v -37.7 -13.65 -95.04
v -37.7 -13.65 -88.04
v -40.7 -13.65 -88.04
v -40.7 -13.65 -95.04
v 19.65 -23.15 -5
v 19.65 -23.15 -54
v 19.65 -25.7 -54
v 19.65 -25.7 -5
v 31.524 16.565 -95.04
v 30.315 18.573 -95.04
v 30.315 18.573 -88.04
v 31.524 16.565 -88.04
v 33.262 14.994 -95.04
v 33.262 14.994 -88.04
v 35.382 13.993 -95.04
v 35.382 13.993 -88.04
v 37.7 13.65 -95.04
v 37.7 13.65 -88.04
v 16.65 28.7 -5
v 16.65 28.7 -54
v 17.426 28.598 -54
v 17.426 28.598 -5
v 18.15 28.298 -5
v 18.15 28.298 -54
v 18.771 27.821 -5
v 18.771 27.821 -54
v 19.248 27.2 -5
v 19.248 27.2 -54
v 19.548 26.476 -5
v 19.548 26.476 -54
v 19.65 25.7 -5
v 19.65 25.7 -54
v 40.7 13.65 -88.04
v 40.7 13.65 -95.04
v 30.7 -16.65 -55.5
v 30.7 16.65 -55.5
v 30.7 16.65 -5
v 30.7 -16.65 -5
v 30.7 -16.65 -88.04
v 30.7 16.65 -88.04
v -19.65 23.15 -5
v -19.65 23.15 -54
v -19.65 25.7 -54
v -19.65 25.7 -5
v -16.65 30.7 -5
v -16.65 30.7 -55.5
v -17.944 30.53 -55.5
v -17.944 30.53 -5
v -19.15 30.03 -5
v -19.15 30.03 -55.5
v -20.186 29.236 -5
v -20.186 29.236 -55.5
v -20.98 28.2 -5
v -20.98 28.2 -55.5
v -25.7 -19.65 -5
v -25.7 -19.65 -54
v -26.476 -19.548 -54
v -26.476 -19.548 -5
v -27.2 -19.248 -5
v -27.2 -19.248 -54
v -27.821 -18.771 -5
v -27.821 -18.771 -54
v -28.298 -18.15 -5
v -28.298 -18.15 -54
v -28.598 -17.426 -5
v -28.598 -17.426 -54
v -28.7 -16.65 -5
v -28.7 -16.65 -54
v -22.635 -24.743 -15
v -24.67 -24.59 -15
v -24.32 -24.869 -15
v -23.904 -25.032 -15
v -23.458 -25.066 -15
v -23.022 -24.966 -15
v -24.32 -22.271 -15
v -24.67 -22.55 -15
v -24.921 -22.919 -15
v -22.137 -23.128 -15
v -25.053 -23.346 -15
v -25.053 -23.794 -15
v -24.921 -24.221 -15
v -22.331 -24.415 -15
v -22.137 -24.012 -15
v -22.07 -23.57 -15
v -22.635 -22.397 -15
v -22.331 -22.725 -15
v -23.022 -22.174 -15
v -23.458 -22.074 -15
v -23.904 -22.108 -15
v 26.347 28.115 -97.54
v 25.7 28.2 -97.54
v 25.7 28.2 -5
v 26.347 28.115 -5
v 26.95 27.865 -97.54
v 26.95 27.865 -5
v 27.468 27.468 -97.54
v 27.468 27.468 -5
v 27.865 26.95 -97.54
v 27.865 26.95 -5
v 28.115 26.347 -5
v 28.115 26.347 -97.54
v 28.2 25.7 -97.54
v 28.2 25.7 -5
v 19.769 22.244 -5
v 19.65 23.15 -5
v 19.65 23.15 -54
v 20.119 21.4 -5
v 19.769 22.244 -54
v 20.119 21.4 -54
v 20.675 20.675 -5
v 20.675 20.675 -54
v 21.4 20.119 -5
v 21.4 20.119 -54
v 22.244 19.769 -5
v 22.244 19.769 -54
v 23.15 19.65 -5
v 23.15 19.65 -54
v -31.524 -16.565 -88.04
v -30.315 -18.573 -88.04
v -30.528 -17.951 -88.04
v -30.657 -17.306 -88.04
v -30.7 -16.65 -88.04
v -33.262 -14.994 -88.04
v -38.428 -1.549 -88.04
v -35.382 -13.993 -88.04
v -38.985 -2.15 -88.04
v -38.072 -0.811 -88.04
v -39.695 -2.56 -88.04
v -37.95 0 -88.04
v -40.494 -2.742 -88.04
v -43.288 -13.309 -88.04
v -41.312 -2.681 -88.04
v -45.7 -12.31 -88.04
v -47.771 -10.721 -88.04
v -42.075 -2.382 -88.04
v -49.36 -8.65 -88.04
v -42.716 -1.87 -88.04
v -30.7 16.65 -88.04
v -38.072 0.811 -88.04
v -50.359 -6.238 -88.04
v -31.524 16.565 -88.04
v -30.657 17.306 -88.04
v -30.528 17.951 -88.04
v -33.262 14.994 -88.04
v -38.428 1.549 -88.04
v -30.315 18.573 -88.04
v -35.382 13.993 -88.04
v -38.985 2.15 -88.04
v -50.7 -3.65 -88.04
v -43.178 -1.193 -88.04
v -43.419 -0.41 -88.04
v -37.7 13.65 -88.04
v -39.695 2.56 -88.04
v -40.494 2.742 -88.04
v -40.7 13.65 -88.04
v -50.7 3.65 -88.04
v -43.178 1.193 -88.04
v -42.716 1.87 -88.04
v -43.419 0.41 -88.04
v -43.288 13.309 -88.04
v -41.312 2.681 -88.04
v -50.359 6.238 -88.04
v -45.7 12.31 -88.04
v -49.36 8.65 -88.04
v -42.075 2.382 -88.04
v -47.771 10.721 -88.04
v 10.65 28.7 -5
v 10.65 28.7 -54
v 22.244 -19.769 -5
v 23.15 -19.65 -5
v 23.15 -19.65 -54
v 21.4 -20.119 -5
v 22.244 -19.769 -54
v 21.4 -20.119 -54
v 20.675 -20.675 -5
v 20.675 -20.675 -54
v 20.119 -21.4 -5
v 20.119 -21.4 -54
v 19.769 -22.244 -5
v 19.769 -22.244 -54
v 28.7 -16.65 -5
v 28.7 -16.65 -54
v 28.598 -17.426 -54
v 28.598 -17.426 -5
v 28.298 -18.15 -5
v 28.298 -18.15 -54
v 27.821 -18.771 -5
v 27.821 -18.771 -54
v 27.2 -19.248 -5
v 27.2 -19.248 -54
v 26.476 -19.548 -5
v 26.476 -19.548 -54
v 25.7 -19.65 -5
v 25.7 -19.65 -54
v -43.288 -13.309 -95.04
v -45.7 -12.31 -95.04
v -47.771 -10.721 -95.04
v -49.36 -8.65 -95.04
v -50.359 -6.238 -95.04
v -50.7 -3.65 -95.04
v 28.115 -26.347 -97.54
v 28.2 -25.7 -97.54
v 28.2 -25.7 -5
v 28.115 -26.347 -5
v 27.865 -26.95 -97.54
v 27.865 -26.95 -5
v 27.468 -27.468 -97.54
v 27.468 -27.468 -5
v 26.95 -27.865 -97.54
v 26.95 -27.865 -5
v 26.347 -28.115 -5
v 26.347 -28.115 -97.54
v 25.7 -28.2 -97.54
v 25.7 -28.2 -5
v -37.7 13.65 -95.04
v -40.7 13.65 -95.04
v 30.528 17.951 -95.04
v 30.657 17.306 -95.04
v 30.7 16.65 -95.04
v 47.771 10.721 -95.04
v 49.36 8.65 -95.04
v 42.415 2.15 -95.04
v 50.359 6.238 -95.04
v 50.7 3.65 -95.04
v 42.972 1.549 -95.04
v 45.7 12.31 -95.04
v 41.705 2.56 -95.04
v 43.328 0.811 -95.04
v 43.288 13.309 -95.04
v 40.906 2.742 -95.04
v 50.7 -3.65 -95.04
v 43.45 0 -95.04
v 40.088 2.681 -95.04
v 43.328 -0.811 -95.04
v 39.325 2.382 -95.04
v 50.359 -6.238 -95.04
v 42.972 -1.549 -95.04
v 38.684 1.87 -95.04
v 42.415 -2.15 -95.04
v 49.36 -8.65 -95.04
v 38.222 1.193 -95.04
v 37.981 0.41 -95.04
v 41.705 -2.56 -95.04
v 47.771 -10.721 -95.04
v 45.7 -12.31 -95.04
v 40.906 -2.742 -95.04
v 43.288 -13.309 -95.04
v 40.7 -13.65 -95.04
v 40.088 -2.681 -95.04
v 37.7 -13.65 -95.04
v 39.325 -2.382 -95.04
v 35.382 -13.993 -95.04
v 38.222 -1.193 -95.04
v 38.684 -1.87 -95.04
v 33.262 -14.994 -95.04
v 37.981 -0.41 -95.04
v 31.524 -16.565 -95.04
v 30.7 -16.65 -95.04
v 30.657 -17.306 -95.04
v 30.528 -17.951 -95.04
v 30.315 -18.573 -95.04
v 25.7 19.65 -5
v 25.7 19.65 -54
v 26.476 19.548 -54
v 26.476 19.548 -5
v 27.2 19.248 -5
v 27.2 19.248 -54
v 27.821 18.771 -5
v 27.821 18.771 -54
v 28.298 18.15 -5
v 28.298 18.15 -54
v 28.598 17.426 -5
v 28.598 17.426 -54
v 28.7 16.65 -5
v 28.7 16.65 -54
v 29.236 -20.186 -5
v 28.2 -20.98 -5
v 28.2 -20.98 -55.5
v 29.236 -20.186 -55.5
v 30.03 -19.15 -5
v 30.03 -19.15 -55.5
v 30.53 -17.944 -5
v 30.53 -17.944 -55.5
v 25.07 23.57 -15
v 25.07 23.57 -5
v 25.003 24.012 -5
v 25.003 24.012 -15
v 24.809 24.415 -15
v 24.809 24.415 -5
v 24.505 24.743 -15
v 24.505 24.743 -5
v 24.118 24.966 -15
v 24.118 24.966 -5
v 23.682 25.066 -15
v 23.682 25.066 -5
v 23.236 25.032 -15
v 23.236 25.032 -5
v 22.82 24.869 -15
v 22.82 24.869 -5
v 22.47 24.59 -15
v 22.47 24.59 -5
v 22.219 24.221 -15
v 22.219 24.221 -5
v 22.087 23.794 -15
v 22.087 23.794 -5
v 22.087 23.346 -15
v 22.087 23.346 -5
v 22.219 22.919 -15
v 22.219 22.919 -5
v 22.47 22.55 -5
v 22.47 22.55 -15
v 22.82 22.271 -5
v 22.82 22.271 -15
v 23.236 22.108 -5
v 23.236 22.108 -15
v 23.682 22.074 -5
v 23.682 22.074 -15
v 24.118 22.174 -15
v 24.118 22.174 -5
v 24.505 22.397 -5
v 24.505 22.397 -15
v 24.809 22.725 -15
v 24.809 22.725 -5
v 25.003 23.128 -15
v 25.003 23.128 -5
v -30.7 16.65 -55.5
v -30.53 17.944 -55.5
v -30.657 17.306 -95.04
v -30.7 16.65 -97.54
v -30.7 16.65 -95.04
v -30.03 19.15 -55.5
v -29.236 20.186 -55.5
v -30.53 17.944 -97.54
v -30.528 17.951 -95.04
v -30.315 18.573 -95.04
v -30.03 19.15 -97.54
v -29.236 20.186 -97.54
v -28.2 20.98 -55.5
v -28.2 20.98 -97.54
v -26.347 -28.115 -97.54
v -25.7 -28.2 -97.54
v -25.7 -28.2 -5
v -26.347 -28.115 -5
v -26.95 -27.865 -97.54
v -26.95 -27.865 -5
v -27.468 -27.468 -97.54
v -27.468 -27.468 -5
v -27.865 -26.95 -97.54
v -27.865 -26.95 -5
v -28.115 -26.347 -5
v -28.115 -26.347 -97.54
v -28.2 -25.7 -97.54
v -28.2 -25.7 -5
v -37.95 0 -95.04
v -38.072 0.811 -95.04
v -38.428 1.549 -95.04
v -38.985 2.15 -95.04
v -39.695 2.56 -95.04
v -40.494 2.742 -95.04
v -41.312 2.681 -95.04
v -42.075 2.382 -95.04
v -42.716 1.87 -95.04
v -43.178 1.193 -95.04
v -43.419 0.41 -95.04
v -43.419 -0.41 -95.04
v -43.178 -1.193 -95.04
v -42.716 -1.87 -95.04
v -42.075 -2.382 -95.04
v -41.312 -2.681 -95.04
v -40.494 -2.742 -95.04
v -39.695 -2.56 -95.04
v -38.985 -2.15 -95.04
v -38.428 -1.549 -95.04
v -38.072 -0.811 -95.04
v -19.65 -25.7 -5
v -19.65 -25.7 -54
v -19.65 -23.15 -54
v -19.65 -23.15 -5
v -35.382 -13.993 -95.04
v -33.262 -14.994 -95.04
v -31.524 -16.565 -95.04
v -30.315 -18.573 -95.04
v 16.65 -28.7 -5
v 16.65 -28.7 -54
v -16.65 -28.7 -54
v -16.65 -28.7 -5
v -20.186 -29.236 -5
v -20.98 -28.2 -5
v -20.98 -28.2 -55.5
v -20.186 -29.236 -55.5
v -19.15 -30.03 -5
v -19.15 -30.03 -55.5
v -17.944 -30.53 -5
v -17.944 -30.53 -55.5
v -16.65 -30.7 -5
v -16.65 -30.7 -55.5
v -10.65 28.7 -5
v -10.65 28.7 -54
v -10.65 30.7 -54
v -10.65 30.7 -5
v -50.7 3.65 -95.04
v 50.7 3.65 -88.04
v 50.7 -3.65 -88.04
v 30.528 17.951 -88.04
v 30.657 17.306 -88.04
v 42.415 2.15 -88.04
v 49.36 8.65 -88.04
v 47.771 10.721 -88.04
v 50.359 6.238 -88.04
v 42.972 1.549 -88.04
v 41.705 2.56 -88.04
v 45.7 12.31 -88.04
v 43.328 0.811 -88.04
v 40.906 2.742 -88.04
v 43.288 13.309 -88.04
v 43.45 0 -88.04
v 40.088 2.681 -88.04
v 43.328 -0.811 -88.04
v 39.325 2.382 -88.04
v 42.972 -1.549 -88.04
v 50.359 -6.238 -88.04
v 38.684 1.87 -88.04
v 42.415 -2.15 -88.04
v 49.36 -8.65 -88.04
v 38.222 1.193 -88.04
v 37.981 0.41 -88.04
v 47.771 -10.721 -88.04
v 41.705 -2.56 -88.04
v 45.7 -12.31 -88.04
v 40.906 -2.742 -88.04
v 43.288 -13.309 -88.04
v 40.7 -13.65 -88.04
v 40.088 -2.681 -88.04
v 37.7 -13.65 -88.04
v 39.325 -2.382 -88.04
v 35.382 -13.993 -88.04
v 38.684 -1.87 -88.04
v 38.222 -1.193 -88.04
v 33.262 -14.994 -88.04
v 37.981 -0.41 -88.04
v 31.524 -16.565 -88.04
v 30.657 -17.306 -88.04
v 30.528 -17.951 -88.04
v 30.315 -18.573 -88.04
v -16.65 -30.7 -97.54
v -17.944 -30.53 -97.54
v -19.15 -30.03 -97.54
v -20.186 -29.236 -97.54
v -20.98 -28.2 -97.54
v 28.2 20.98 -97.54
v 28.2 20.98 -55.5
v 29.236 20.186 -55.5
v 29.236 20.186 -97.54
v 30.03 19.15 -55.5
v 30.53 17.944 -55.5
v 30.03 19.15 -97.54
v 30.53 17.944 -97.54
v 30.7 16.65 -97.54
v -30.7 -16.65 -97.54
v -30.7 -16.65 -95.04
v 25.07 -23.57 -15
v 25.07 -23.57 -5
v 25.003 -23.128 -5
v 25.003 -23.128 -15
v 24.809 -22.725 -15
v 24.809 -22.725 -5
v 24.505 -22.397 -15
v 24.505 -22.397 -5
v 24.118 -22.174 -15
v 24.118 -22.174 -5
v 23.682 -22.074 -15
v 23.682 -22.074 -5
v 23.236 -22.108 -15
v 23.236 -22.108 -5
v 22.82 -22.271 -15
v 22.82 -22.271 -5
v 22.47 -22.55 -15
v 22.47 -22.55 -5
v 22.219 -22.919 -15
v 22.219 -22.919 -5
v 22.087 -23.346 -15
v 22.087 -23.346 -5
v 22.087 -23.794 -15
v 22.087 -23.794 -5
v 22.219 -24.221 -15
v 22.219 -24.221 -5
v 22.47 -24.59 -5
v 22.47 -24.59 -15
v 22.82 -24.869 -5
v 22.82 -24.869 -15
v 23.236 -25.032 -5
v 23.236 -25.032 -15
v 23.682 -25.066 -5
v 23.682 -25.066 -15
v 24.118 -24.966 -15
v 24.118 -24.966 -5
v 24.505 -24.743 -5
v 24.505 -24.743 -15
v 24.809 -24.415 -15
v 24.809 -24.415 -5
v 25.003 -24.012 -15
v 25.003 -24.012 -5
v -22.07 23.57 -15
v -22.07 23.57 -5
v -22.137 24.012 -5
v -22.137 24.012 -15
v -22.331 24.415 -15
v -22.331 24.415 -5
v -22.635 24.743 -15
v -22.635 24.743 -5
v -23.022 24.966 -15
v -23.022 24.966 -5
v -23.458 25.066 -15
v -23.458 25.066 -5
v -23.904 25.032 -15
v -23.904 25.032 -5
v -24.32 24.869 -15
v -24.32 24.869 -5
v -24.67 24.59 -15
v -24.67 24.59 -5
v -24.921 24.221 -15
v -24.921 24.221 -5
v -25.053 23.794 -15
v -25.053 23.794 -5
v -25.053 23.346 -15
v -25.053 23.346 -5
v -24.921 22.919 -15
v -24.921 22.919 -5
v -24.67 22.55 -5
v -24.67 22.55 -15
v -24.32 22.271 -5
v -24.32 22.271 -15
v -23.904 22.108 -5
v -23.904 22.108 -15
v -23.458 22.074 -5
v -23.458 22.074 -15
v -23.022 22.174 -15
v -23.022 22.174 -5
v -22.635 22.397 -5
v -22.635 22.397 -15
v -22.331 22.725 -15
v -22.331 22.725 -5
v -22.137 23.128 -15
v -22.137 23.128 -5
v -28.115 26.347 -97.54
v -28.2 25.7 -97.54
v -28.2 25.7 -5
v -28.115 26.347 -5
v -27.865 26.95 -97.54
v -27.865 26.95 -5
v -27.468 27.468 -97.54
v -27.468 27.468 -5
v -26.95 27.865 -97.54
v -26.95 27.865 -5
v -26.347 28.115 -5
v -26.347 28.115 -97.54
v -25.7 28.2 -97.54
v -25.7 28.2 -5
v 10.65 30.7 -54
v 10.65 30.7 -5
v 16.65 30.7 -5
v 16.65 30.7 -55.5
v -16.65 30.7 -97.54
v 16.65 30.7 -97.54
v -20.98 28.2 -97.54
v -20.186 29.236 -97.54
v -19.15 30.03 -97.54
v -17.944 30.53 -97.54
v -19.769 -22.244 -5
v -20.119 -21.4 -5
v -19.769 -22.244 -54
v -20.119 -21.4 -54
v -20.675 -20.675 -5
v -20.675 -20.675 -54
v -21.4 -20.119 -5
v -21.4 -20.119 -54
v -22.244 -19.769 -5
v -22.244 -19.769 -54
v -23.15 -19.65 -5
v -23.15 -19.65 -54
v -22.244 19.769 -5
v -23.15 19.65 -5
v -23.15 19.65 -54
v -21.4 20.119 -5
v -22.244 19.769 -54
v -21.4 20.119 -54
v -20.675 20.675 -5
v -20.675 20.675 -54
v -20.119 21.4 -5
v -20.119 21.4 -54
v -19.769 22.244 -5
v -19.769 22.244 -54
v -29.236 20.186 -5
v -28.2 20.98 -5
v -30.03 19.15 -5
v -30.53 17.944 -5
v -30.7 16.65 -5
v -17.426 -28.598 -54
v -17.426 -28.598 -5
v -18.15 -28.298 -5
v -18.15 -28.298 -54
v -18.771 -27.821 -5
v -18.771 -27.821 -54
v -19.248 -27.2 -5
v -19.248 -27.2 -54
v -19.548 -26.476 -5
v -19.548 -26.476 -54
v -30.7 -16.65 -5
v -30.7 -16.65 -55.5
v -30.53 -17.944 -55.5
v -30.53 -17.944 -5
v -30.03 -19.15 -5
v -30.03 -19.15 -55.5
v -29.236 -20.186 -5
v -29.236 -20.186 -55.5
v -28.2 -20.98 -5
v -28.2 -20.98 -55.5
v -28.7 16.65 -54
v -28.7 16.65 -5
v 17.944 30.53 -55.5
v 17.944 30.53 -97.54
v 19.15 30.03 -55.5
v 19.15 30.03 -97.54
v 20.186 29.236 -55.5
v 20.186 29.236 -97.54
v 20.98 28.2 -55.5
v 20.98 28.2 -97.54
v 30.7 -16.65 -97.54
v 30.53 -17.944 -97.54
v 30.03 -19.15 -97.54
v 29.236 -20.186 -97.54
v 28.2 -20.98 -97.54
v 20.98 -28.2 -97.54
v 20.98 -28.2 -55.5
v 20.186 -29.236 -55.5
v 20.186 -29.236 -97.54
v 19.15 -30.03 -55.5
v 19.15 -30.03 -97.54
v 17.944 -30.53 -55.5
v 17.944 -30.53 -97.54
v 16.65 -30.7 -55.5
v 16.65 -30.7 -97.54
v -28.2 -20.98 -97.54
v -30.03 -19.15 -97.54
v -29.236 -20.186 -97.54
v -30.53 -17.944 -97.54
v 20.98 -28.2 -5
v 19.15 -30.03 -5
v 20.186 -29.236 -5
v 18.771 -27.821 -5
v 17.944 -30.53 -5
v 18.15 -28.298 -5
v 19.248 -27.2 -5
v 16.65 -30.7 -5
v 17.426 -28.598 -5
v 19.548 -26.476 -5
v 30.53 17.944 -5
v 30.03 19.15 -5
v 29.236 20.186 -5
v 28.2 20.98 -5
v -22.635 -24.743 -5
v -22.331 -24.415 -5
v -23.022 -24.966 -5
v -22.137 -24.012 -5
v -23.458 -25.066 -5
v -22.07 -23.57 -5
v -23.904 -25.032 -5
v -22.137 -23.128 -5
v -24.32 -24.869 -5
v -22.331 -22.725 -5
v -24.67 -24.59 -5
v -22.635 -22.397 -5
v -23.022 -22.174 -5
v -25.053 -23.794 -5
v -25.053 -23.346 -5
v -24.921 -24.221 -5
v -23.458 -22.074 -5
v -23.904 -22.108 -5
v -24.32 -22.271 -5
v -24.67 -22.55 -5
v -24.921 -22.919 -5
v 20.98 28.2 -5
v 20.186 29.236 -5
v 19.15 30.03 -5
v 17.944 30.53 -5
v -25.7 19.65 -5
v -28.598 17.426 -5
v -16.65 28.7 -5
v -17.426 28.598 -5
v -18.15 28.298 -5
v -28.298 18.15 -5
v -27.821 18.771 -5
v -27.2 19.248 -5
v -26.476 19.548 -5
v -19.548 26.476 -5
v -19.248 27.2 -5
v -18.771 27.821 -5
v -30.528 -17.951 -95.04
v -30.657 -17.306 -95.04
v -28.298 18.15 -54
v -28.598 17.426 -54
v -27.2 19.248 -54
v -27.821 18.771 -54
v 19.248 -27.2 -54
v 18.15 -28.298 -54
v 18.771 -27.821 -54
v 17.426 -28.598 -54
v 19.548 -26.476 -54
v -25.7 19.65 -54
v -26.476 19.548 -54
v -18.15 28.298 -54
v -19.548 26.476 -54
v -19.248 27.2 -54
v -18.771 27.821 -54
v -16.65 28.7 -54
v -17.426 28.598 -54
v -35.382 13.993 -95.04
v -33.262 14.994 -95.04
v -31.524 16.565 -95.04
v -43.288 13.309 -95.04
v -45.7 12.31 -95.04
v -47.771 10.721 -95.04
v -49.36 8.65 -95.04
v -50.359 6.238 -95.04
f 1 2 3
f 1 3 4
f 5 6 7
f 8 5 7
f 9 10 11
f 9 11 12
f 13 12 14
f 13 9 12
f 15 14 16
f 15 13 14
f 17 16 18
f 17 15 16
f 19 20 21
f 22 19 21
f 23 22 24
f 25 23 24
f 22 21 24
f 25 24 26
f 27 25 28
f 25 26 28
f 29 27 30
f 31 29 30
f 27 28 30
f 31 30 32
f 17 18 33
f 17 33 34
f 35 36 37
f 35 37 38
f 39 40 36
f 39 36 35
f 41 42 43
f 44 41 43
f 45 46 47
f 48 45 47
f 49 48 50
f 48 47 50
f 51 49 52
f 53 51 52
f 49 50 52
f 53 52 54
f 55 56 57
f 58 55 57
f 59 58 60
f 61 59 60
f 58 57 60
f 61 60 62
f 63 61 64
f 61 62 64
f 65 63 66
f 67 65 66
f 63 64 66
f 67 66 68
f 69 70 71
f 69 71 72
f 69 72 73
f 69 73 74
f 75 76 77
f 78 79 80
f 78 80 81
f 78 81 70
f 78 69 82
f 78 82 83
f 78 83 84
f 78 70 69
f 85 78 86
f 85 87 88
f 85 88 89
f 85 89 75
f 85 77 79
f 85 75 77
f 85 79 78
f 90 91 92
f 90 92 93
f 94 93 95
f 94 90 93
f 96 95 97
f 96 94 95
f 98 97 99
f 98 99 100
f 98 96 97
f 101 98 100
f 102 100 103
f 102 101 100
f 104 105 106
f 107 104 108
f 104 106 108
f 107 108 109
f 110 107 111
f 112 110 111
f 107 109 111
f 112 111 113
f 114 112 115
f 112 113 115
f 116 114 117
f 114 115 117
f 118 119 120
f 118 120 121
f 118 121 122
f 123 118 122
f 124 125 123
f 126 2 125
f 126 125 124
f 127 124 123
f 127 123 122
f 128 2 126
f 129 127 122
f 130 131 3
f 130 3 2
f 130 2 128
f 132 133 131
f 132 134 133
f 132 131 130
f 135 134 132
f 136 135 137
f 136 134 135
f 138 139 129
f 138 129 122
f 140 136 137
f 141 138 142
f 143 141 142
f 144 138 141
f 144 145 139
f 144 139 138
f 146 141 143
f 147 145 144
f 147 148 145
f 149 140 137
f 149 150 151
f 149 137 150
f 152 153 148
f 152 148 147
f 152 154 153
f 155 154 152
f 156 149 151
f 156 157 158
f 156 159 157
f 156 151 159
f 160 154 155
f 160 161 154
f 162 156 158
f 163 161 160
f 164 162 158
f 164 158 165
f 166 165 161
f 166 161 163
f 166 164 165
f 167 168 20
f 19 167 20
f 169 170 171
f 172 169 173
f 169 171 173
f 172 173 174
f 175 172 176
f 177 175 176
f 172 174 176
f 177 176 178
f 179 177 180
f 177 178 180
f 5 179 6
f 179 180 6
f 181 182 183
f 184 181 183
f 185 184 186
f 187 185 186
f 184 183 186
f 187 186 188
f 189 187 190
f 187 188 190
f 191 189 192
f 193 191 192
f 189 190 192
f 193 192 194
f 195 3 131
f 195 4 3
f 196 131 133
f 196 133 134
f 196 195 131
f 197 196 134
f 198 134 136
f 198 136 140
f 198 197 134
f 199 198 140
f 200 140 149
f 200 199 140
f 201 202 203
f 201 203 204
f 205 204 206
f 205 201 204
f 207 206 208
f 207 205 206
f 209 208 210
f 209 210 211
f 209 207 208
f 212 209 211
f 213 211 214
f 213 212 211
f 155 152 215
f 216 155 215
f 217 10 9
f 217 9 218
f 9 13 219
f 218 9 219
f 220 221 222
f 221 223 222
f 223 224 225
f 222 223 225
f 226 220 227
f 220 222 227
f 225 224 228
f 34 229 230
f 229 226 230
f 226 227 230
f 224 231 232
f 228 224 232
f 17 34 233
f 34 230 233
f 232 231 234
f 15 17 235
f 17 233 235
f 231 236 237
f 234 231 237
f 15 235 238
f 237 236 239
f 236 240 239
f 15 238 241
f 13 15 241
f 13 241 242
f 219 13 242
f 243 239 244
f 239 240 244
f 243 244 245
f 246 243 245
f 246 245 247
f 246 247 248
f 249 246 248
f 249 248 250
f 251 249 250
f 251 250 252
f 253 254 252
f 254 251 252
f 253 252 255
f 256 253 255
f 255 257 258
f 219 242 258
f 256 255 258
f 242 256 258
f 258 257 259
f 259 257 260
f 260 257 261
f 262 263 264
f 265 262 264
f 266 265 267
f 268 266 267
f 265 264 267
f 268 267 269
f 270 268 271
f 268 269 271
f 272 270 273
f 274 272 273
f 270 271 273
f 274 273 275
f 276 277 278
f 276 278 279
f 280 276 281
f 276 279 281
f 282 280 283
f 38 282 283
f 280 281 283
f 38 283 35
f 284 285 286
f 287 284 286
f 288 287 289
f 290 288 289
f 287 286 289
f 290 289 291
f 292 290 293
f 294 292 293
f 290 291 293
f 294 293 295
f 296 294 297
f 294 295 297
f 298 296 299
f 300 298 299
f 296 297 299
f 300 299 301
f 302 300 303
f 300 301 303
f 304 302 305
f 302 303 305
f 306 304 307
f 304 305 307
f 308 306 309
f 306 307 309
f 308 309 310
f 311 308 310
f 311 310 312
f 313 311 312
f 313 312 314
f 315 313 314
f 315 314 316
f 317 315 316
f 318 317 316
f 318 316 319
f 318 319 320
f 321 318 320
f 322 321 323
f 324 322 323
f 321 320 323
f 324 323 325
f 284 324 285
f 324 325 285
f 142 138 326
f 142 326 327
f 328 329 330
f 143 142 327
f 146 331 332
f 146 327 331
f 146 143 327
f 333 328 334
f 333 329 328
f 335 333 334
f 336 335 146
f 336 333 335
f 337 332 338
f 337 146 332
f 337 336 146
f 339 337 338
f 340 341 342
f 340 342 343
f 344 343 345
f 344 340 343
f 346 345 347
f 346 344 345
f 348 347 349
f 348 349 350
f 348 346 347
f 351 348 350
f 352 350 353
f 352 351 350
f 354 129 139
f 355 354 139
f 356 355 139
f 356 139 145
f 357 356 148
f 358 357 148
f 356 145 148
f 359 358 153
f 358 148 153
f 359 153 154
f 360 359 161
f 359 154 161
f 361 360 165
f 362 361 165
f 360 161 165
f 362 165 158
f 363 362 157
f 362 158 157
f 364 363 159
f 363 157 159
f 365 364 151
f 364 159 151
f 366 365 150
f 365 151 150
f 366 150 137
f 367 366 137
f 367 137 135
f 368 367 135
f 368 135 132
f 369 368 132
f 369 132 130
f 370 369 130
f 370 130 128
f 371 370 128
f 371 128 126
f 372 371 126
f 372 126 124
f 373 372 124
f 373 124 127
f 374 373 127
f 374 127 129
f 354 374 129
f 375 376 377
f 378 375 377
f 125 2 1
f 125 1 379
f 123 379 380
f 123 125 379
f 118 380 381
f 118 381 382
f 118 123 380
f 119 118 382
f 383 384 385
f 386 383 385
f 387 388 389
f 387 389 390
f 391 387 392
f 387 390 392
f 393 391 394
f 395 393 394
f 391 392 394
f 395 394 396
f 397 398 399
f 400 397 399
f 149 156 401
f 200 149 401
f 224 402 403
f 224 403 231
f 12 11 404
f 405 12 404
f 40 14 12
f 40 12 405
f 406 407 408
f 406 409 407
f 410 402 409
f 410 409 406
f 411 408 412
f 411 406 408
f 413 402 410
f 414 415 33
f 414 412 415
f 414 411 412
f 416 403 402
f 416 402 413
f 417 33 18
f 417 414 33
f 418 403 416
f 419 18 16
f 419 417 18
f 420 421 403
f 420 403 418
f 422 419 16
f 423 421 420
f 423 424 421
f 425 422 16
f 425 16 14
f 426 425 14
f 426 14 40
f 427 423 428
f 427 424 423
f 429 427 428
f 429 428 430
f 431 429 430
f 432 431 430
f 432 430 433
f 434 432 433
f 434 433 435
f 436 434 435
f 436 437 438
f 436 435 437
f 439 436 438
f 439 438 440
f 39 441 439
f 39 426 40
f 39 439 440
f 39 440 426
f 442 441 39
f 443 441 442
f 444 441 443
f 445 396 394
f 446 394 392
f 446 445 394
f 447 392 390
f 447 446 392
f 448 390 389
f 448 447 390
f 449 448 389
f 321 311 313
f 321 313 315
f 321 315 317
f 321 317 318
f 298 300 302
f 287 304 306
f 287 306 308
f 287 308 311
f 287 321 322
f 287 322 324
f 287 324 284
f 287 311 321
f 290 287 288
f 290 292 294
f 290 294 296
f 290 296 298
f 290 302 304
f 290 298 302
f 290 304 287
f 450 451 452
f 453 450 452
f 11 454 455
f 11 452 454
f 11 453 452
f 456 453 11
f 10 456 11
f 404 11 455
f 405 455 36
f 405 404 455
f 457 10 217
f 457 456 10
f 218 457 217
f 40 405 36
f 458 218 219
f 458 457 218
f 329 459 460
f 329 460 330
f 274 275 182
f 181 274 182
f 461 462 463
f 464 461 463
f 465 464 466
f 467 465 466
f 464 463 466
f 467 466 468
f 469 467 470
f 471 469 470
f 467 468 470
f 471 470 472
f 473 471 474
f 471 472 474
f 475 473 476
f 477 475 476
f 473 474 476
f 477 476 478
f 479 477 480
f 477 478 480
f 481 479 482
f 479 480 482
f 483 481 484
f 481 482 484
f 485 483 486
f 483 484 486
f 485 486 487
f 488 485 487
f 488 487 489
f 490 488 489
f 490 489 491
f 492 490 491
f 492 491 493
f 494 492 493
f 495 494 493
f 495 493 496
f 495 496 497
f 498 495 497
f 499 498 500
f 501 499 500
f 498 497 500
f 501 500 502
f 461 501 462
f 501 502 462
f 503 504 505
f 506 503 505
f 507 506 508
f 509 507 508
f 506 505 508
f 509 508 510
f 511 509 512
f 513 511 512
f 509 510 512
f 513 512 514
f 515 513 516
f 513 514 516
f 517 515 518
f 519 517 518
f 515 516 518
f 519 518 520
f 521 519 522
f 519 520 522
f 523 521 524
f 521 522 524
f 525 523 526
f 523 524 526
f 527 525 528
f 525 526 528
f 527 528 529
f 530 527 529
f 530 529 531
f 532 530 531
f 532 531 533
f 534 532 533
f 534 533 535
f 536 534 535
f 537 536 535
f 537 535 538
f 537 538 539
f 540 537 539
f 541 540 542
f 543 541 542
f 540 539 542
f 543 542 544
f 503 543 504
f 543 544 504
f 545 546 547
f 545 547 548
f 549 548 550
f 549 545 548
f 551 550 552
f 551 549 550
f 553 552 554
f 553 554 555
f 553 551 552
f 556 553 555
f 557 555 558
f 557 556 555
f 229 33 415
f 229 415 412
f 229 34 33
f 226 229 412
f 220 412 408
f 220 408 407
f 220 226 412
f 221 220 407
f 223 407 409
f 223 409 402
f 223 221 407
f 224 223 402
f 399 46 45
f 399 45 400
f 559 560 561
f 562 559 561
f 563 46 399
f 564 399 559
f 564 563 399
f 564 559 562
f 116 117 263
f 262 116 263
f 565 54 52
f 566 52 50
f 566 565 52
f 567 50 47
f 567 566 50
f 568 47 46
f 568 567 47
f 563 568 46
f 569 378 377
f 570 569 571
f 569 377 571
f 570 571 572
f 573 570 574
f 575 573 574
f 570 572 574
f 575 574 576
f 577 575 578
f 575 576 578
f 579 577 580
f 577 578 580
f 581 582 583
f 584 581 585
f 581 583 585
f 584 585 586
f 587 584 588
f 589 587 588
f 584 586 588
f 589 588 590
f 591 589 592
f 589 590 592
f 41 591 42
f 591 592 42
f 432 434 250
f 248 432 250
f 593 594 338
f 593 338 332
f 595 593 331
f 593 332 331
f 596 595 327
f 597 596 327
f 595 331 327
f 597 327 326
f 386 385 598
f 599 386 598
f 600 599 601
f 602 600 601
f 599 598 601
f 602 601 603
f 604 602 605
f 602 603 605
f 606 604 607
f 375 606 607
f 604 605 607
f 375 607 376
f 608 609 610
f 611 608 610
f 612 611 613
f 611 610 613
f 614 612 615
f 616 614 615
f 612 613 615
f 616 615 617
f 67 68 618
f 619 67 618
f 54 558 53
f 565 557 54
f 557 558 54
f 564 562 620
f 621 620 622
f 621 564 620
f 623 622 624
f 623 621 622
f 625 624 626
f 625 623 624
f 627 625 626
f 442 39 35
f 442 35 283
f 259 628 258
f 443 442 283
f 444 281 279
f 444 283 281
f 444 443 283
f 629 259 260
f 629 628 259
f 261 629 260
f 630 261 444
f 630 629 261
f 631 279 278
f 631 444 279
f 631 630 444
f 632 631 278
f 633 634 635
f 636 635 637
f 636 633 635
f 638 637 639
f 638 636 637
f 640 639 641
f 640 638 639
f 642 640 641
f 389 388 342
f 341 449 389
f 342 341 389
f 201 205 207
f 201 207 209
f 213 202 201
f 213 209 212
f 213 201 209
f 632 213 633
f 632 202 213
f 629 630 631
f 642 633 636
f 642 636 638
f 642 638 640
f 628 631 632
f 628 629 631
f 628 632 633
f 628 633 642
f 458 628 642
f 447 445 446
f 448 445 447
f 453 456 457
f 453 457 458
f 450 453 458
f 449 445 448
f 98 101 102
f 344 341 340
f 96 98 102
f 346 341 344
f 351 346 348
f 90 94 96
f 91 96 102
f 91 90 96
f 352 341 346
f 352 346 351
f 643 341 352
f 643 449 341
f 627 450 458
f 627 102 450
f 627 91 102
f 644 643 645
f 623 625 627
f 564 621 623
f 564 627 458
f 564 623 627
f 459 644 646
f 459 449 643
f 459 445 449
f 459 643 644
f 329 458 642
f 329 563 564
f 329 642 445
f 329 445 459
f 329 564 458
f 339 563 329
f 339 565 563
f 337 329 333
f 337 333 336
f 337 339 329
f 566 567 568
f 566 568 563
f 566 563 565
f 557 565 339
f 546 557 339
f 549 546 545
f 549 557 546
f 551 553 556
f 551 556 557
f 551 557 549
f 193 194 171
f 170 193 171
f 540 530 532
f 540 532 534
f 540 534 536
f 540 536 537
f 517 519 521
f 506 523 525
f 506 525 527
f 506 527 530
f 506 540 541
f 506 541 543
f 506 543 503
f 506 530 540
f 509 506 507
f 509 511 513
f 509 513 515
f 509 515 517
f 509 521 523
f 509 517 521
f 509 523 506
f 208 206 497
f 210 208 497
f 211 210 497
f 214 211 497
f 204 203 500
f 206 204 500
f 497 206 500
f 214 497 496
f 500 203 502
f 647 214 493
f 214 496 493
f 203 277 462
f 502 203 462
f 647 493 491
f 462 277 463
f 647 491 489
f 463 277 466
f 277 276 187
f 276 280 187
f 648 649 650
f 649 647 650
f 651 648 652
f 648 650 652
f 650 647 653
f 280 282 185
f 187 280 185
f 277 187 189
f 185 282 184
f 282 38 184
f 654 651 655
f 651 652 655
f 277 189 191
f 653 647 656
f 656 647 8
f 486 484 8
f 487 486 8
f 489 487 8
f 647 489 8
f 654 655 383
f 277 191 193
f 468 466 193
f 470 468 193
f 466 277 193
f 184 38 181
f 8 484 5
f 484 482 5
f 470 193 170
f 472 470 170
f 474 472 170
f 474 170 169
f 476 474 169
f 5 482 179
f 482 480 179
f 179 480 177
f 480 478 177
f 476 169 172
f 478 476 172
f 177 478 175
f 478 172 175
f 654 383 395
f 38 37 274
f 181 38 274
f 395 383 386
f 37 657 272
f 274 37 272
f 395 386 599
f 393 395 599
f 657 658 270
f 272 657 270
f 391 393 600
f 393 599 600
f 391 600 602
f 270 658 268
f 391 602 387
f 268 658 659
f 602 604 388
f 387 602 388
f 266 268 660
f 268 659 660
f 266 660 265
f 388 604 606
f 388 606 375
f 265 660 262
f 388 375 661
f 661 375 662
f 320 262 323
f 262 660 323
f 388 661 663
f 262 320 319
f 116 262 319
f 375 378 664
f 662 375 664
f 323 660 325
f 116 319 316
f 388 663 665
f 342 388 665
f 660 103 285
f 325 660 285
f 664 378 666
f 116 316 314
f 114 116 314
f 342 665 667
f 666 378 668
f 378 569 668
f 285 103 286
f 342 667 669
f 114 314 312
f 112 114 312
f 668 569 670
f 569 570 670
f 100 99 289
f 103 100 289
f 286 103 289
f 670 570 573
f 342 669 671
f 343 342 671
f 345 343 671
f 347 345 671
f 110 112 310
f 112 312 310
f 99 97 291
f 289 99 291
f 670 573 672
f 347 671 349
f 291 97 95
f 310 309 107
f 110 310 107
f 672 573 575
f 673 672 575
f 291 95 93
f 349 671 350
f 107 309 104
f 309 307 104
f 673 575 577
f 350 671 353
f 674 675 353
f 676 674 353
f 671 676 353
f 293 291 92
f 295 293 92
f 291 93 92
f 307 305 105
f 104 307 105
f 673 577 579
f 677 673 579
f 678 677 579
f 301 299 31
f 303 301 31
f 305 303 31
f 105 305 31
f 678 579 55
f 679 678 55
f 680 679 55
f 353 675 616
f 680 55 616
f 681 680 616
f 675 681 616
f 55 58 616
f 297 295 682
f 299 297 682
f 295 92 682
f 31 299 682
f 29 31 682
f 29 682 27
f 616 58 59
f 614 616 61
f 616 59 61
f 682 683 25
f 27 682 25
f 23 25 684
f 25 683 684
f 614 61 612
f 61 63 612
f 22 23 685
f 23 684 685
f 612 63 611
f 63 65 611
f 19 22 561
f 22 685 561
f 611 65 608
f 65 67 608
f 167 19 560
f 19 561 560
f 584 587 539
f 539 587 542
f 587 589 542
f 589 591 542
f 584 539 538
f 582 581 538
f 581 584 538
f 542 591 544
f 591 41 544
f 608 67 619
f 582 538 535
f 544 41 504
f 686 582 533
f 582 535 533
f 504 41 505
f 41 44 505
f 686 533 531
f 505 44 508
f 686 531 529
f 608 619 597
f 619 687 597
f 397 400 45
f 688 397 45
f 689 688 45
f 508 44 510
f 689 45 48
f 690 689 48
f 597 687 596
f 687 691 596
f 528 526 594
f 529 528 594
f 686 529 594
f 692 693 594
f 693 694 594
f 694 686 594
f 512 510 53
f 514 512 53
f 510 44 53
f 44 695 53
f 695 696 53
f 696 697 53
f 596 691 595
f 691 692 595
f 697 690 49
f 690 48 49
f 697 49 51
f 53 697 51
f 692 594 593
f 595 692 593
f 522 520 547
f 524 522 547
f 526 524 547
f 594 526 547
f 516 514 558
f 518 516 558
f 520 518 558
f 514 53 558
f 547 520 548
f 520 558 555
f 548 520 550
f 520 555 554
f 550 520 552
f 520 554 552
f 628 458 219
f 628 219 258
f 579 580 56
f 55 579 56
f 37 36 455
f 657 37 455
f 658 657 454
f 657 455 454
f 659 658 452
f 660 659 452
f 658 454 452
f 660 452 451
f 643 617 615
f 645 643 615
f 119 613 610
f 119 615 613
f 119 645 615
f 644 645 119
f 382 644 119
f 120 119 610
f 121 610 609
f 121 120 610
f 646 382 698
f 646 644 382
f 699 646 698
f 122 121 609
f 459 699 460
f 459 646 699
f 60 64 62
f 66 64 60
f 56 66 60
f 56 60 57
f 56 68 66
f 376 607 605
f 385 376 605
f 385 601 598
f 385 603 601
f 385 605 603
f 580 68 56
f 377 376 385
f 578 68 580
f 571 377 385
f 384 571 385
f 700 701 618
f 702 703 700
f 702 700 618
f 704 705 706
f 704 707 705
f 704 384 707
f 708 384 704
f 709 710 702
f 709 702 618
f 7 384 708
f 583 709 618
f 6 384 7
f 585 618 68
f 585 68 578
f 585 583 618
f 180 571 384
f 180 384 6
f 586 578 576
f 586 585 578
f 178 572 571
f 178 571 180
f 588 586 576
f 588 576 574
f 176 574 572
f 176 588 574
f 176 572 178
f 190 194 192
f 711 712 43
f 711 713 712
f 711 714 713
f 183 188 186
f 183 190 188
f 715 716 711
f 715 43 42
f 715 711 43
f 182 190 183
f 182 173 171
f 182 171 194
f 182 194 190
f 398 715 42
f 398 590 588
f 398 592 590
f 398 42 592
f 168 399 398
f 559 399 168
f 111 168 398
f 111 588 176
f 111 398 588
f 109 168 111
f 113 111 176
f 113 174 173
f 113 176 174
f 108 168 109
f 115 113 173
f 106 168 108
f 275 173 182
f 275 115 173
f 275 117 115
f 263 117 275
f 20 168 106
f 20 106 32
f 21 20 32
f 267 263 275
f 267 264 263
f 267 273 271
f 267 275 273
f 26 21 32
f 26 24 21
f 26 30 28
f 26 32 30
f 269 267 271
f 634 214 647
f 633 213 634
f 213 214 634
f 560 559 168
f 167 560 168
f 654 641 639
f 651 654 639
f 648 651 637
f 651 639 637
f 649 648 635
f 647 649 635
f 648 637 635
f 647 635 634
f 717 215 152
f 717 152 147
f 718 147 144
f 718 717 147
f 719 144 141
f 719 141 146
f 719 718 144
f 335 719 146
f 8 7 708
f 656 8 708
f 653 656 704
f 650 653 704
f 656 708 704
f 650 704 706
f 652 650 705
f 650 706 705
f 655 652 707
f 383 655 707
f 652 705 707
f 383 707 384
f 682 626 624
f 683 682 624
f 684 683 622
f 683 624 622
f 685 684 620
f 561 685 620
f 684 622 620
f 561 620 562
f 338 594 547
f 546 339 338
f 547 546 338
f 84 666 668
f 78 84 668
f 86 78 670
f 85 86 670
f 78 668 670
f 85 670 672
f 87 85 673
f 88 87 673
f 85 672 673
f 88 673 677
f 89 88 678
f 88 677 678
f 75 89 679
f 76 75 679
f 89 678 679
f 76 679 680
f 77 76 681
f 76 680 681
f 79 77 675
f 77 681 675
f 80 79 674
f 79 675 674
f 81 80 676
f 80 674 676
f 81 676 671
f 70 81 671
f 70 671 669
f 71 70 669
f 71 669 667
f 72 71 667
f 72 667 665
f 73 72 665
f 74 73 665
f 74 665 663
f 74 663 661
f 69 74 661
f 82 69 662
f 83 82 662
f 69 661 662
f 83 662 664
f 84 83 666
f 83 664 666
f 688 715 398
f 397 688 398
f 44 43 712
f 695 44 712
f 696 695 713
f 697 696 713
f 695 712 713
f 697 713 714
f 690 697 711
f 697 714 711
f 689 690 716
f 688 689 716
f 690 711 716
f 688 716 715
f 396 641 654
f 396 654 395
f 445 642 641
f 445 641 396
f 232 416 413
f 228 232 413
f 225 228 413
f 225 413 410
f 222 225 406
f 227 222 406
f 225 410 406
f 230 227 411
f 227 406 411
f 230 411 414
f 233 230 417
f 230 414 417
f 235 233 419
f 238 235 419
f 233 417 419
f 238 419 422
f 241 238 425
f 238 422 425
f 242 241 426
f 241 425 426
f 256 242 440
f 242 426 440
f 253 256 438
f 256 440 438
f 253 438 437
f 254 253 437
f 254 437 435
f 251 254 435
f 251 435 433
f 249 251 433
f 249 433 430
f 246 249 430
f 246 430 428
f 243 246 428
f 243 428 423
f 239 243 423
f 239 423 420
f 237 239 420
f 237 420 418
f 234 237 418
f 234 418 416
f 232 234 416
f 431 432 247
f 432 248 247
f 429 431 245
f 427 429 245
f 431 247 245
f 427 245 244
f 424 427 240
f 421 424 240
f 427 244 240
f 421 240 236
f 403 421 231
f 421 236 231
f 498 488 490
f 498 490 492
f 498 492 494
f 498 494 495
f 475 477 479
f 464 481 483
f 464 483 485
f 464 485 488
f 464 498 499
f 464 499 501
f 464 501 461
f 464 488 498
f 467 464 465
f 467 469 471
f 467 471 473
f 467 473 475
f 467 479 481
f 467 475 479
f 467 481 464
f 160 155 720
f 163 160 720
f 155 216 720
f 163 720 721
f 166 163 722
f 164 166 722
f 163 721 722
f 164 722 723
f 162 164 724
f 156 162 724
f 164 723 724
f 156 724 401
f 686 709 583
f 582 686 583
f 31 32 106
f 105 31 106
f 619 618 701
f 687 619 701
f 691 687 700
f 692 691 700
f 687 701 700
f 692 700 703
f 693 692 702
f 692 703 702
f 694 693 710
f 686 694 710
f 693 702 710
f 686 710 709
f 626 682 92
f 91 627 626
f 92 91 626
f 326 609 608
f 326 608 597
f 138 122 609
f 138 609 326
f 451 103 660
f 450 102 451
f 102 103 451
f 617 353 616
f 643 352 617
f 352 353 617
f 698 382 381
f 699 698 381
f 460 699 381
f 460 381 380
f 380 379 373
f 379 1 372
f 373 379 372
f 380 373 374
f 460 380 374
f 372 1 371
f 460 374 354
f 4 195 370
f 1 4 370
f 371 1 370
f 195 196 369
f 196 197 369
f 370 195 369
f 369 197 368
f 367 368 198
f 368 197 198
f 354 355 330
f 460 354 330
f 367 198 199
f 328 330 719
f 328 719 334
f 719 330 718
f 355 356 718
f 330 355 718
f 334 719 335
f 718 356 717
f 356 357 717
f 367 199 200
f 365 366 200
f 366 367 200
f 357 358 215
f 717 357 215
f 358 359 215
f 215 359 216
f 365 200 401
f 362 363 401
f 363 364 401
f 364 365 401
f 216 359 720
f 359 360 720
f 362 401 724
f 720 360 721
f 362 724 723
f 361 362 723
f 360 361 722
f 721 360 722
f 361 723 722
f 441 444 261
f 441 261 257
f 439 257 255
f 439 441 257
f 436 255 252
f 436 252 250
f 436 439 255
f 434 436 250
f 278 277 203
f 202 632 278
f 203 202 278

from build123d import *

# Parameters (mm, degrees)
BOSS_EXTRUDE1_DEPTH = 49
BOSS_EXTRUDE2_START = 1.5
BOSS_EXTRUDE2_DEPTH = 1.5
BOSS_EXTRUDE3_DEPTH = 50.5
SKETCH4_R           = 1.5
CUT_EXTRUDE1_DEPTH  = 10
BOSS_EXTRUDE4_START = 42.04
BOSS_EXTRUDE4_DEPTH = 42.04
SKETCH7_W           = 7
SKETCH7_H           = 27.3
BOSS_EXTRUDE5_DEPTH = 20
FILLET1_R           = 10
FILLET2_R           = 8
FILLET3_R           = 10
FILLET4_R           = 8
SKETCH8_R           = 2.75
CUT_EXTRUDE2_DEPTH  = 9.5


with BuildPart() as part:
    # Sketch1 → Boss-Extrude1 (new body)
    with BuildSketch(Plane(origin=(0, 0, -54), x_dir=(-1, 0, 0), z_dir=(0, 0, -1))):
        with BuildLine():
            Line((-25.7, -19.65), (-23.15, -19.65))
            ThreePointArc((-23.15, -19.65), (-20.675126266, -20.675126266), (-19.65, -23.15))
            Line((-19.65, -23.15), (-19.65, -25.7))
            ThreePointArc((-19.65, -25.7), (-18.771320344, -27.821320344), (-16.65, -28.7))
            Line((-16.65, -28.7), (16.65, -28.7))
            ThreePointArc((16.65, -28.7), (18.771320344, -27.821320344), (19.65, -25.7))
            Line((19.65, -25.7), (19.65, -23.15))
            ThreePointArc((19.65, -23.15), (20.675126266, -20.675126266), (23.15, -19.65))
            Line((23.15, -19.65), (25.7, -19.65))
            ThreePointArc((25.7, -19.65), (27.821320344, -18.771320344), (28.7, -16.65))
            Line((28.7, -16.65), (28.7, 16.65))
            ThreePointArc((28.7, 16.65), (27.821320344, 18.771320344), (25.7, 19.65))
            Line((25.7, 19.65), (23.15, 19.65))
            ThreePointArc((23.15, 19.65), (20.675126266, 20.675126266), (19.65, 23.15))
            Line((19.65, 23.15), (19.65, 25.7))
            ThreePointArc((19.65, 25.7), (18.771320344, 27.821320344), (16.65, 28.7))
            Line((16.65, 28.7), (10.65, 28.7))
            Line((10.65, 28.7), (10.65, 30.7))
            Line((10.65, 30.7), (16.65, 30.7))
            ThreePointArc((16.65, 30.7), (20.185533906, 29.235533906), (21.65, 25.7))
            Line((21.65, 25.7), (21.65, 23.15))
            ThreePointArc((21.65, 23.15), (22.089339828, 22.089339828), (23.15, 21.65))
            Line((23.15, 21.65), (25.7, 21.65))
            ThreePointArc((25.7, 21.65), (29.235533906, 20.185533906), (30.7, 16.65))
            Line((30.7, 16.65), (30.7, -16.65))
            ThreePointArc((30.7, -16.65), (29.235533906, -20.185533906), (25.7, -21.65))
            Line((25.7, -21.65), (23.15, -21.65))
            ThreePointArc((23.15, -21.65), (22.089339828, -22.089339828), (21.65, -23.15))
            Line((21.65, -23.15), (21.65, -25.7))
            ThreePointArc((21.65, -25.7), (20.185533906, -29.235533906), (16.65, -30.7))
            Line((16.65, -30.7), (-16.65, -30.7))
            ThreePointArc((-16.65, -30.7), (-20.185533906, -29.235533906), (-21.65, -25.7))
            Line((-21.65, -25.7), (-21.65, -23.15))
            ThreePointArc((-21.65, -23.15), (-22.089339828, -22.089339828), (-23.15, -21.65))
            Line((-23.15, -21.65), (-25.7, -21.65))
            ThreePointArc((-25.7, -21.65), (-29.235533906, -20.185533906), (-30.7, -16.65))
            Line((-30.7, -16.65), (-30.7, 16.65))
            ThreePointArc((-30.7, 16.65), (-29.235533906, 20.185533906), (-25.7, 21.65))
            Line((-25.7, 21.65), (-23.15, 21.65))
            ThreePointArc((-23.15, 21.65), (-22.089339828, 22.089339828), (-21.65, 23.15))
            Line((-21.65, 23.15), (-21.65, 25.7))
            ThreePointArc((-21.65, 25.7), (-20.185533906, 29.235533906), (-16.65, 30.7))
            Line((-16.65, 30.7), (-10.65, 30.7))
            Line((-10.65, 30.7), (-10.65, 28.7))
            Line((-10.65, 28.7), (-16.65, 28.7))
            ThreePointArc((-16.65, 28.7), (-18.771320344, 27.821320344), (-19.65, 25.7))
            Line((-19.65, 25.7), (-19.65, 23.15))
            ThreePointArc((-19.65, 23.15), (-20.675126266, 20.675126266), (-23.15, 19.65))
            Line((-23.15, 19.65), (-25.7, 19.65))
            ThreePointArc((-25.7, 19.65), (-27.821320344, 18.771320344), (-28.7, 16.65))
            Line((-28.7, 16.65), (-28.7, -16.65))
            ThreePointArc((-28.7, -16.65), (-27.821320344, -18.771320344), (-25.7, -19.65))
        make_face()
    extrude(amount=-BOSS_EXTRUDE1_DEPTH)

    # Sketch2 → Boss-Extrude2 (add)
    with BuildSketch(Plane(origin=(0, 0, -54), x_dir=(-1, 0, 0), z_dir=(0, 0, -1)).offset(BOSS_EXTRUDE2_START)):
        with BuildLine():
            Line((-10.65, 30.7), (10.65, 30.7))
            Line((10.65, 30.7), (16.65, 30.7))
            ThreePointArc((16.65, 30.7), (20.185533906, 29.235533906), (21.65, 25.7))
            Line((21.65, 25.7), (21.65, 23.15))
            ThreePointArc((21.65, 23.15), (22.089339828, 22.089339828), (23.15, 21.65))
            Line((23.15, 21.65), (25.7, 21.65))
            ThreePointArc((25.7, 21.65), (29.235533906, 20.185533906), (30.7, 16.65))
            Line((30.7, 16.65), (30.7, -16.65))
            ThreePointArc((30.7, -16.65), (29.235533906, -20.185533906), (25.7, -21.65))
            Line((25.7, -21.65), (23.15, -21.65))
            ThreePointArc((23.15, -21.65), (22.089339828, -22.089339828), (21.65, -23.15))
            Line((21.65, -23.15), (21.65, -25.7))
            ThreePointArc((21.65, -25.7), (20.185533906, -29.235533906), (16.65, -30.7))
            Line((16.65, -30.7), (-16.65, -30.7))
            ThreePointArc((-16.65, -30.7), (-20.185533906, -29.235533906), (-21.65, -25.7))
            Line((-21.65, -25.7), (-21.65, -23.15))
            ThreePointArc((-21.65, -23.15), (-22.089339828, -22.089339828), (-23.15, -21.65))
            Line((-23.15, -21.65), (-25.7, -21.65))
            ThreePointArc((-25.7, -21.65), (-29.235533906, -20.185533906), (-30.7, -16.65))
            Line((-30.7, -16.65), (-30.7, 16.65))
            ThreePointArc((-30.7, 16.65), (-29.235533906, 20.185533906), (-25.7, 21.65))
            Line((-25.7, 21.65), (-23.15, 21.65))
            ThreePointArc((-23.15, 21.65), (-22.089339828, 22.089339828), (-21.65, 23.15))
            Line((-21.65, 23.15), (-21.65, 25.7))
            ThreePointArc((-21.65, 25.7), (-20.185533906, 29.235533906), (-16.65, 30.7))
            Line((-16.65, 30.7), (-10.65, 30.7))
        make_face()
    extrude(amount=-BOSS_EXTRUDE2_DEPTH)

    # Sketch3 → Boss-Extrude3 (add)
    with BuildSketch(Plane(origin=(0, 0, -55.5), x_dir=(-1, 0, 0), z_dir=(0, 0, -1))):
        with BuildLine():
            Line((-21.65, 23.15), (-21.65, 25.7))
            ThreePointArc((-21.65, 25.7), (-21.479629131, 26.994095226), (-20.980127019, 28.2))
            Line((-20.980127019, 28.2), (-25.7, 28.2))
            ThreePointArc((-25.7, 28.2), (-27.467766953, 27.467766953), (-28.2, 25.7))
            Line((-28.2, 25.7), (-28.2, 20.980127019))
            ThreePointArc((-28.2, 20.980127019), (-26.994095226, 21.479629131), (-25.7, 21.65))
            Line((-25.7, 21.65), (-23.15, 21.65))
            ThreePointArc((-23.15, 21.65), (-22.089339828, 22.089339828), (-21.65, 23.15))
        make_face()
        with BuildLine():
            Line((21.65, 25.7), (21.65, 23.15))
            ThreePointArc((21.65, 23.15), (22.089339828, 22.089339828), (23.15, 21.65))
            Line((23.15, 21.65), (25.7, 21.65))
            ThreePointArc((25.7, 21.65), (26.994095226, 21.479629131), (28.2, 20.980127019))
            Line((28.2, 20.980127019), (28.2, 25.7))
            ThreePointArc((28.2, 25.7), (27.467766953, 27.467766953), (25.7, 28.2))
            Line((25.7, 28.2), (20.980127019, 28.2))
            ThreePointArc((20.980127019, 28.2), (21.479629131, 26.994095226), (21.65, 25.7))
        make_face()
        with BuildLine():
            Line((-23.15, -21.65), (-25.7, -21.65))
            ThreePointArc((-25.7, -21.65), (-26.994095226, -21.479629131), (-28.2, -20.980127019))
            Line((-28.2, -20.980127019), (-28.2, -25.7))
            ThreePointArc((-28.2, -25.7), (-27.467766953, -27.467766953), (-25.7, -28.2))
            Line((-25.7, -28.2), (-20.980127019, -28.2))
            ThreePointArc((-20.980127019, -28.2), (-21.479629131, -26.994095226), (-21.65, -25.7))
            Line((-21.65, -25.7), (-21.65, -23.15))
            ThreePointArc((-21.65, -23.15), (-22.089339828, -22.089339828), (-23.15, -21.65))
        make_face()
        with BuildLine():
            Line((20.980127019, -28.2), (25.7, -28.2))
            ThreePointArc((25.7, -28.2), (27.467766953, -27.467766953), (28.2, -25.7))
            Line((28.2, -25.7), (28.2, -20.980127019))
            ThreePointArc((28.2, -20.980127019), (26.994095226, -21.479629131), (25.7, -21.65))
            Line((25.7, -21.65), (23.15, -21.65))
            ThreePointArc((23.15, -21.65), (22.089339828, -22.089339828), (21.65, -23.15))
            Line((21.65, -23.15), (21.65, -25.7))
            ThreePointArc((21.65, -25.7), (21.479629131, -26.994095226), (20.980127019, -28.2))
        make_face()
    extrude(amount=-BOSS_EXTRUDE3_DEPTH)

    # Sketch4 → Cut-Extrude1 (cut)
    with BuildSketch(Plane.XY.offset(-5)):
        with Locations((-23.57, 23.57)):
            Circle(SKETCH4_R)
        with Locations((23.57, 23.57)):
            Circle(SKETCH4_R)
        with Locations((-23.57, -23.57)):
            Circle(SKETCH4_R)
        with Locations((23.57, -23.57)):
            Circle(SKETCH4_R)
    extrude(amount=-CUT_EXTRUDE1_DEPTH, mode=Mode.SUBTRACT)

    # Sketch5 → Boss-Extrude4 (add)
    with BuildSketch(Plane(origin=(0, 0, -55.5), x_dir=(-1, 0, 0), z_dir=(0, 0, -1)).offset(BOSS_EXTRUDE4_START)):
        with BuildLine():
            Line((28.2, -25.7), (28.2, -20.980127019))
            ThreePointArc((28.2, -20.980127019), (30.030127019, -19.15), (30.7, -16.65))
            Line((30.7, -16.65), (30.7, 16.65))
            ThreePointArc((30.7, 16.65), (30.030127019, 19.15), (28.2, 20.980127019))
            Line((28.2, 20.980127019), (28.2, 25.7))
            ThreePointArc((28.2, 25.7), (27.467766953, 27.467766953), (25.7, 28.2))
            Line((25.7, 28.2), (20.980127019, 28.2))
            ThreePointArc((20.980127019, 28.2), (19.15, 30.030127019), (16.65, 30.7))
            Line((16.65, 30.7), (-16.65, 30.7))
            ThreePointArc((-16.65, 30.7), (-19.15, 30.030127019), (-20.980127019, 28.2))
            Line((-20.980127019, 28.2), (-25.7, 28.2))
            ThreePointArc((-25.7, 28.2), (-27.467766953, 27.467766953), (-28.2, 25.7))
            Line((-28.2, 25.7), (-28.2, 20.980127019))
            ThreePointArc((-28.2, 20.980127019), (-30.030127019, 19.15), (-30.7, 16.65))
            Line((-30.7, 16.65), (-30.7, -16.65))
            ThreePointArc((-30.7, -16.65), (-30.030127019, -19.15), (-28.2, -20.980127019))
            Line((-28.2, -20.980127019), (-28.2, -25.7))
            ThreePointArc((-28.2, -25.7), (-27.467766953, -27.467766953), (-25.7, -28.2))
            Line((-25.7, -28.2), (-20.980127019, -28.2))
            ThreePointArc((-20.980127019, -28.2), (-19.15, -30.030127019), (-16.65, -30.7))
            Line((-16.65, -30.7), (16.65, -30.7))
            ThreePointArc((16.65, -30.7), (19.15, -30.030127019), (20.980127019, -28.2))
            Line((20.980127019, -28.2), (25.7, -28.2))
            ThreePointArc((25.7, -28.2), (27.467766953, -27.467766953), (28.2, -25.7))
        make_face()
    extrude(amount=-BOSS_EXTRUDE4_DEPTH)

    # Sketch7 → Boss-Extrude5 (add)
    with BuildSketch(Plane(origin=(30.7, 0, 0), x_dir=(0, 0, -1), z_dir=(1, 0, 0))):
        with Locations((91.54, 0)):
            Rectangle(SKETCH7_W, SKETCH7_H)
    boss_extrude5 = extrude(amount=BOSS_EXTRUDE5_DEPTH)

    # Fillet1
    fillet1_edges = [part.edges().sort_by_distance(p)[0] for p in [
        (50.7, 13.65, -91.54),
        (50.7, -13.65, -91.54),
    ]]
    fillet(fillet1_edges, radius=FILLET1_R)

    # Fillet2
    # the kernel refuses this fillet: 8 mm, written as the material it adds along each edge
    with BuildSketch(Plane(origin=(30.7, 13.65, -95.04), x_dir=(-0.07788766729291054, 0.9969621413492434, 0), z_dir=(0, 0, 1))) as fillet2_piece_1:
        with BuildLine():
            CenterArc((7.43048346, -7.601836328), FILLET2_R, 108.152705887, 67.380135052)
            Line((-0.545213671, -6.978734989), (-1.342783384, -6.916424856))
            Line((-1.342783384, -6.916424856), (-0.797569713, 0.062310134))
            Line((-0.797569713, 0.062310134), (0.062310134, 0.797569713))
            ThreePointArc((0.062310134, 0.797569713), (3.053196558, 0.563906711), (4.688837571, 0.760183633))
            Line((4.688837571, 0.760183633), (4.938078106, 0))
        make_face()
    extrude(amount=7)
    with BuildSketch(Plane(origin=(30.7, -13.65, -88.04), x_dir=(1, 0, 0), z_dir=(0, 0, -1))) as fillet2_piece_2:
        with BuildLine():
            CenterArc((7, 8), FILLET2_R, 202.619864948, 67.380135052)
            Line((-0.384615385, 4.923076923), (-1.123076923, 4.615384615))
            ThreePointArc((-1.123076923, 4.615384615), (-0.8, 3), (-0.8, 0))
            Line((-0.8, 0), (0, -0.8))
            Line((0, -0.8), (7, -0.8))
            Line((7, -0.8), (7, 0))
        make_face()
    extrude(amount=7)

    # Mirror1: Boss-Extrude5 across plane
    add(boss_extrude5.mirror(Plane(origin=(0, 0, 0), x_dir=(0, 0, 1), z_dir=(1, 0, 0))))

    # Fillet3
    fillet3_edges = [part.edges().sort_by_distance(p)[0] for p in [
        (-50.7, -13.65, -91.54),
        (-50.7, 13.65, -91.54),
    ]]
    fillet(fillet3_edges, radius=FILLET3_R)

    # Fillet4
    # the kernel refuses this fillet: 8 mm, written as the material it adds along each edge
    with BuildSketch(Plane(origin=(-30.7, 13.65, -95.04), x_dir=(-1, 0, 0), z_dir=(0, 0, 1))) as fillet4_piece_1:
        with BuildLine():
            CenterArc((7, -8), FILLET4_R, 90, 67.380135052)
            Line((-0.384615385, -4.923076923), (-1.123076923, -4.615384615))
            ThreePointArc((-1.123076923, -4.615384615), (-0.8, -3), (-0.8, 0))
            Line((-0.8, 0), (0, 0.8))
            Line((0, 0.8), (7, 0.8))
            Line((7, 0.8), (7, 0))
        make_face()
    extrude(amount=7)
    with BuildSketch(Plane(origin=(-30.7, -13.65, -88.04), x_dir=(0.07788766729291037, -0.9969621413492434, 0), z_dir=(0, 0, -1))) as fillet4_piece_2:
        with BuildLine():
            CenterArc((7.43048346, 7.601836328), FILLET4_R, 184.467159061, 67.380135052)
            Line((-0.545213671, 6.978734989), (-1.342783384, 6.916424856))
            Line((-1.342783384, 6.916424856), (-0.797569713, -0.062310134))
            Line((-0.797569713, -0.062310134), (0.062310134, -0.797569713))
            ThreePointArc((0.062310134, -0.797569713), (3.053196558, -0.563906711), (4.688837571, -0.760183633))
            Line((4.688837571, -0.760183633), (4.938078106, 0))
        make_face()
    extrude(amount=7)

    # Sketch8 → Cut-Extrude2 (cut)
    with BuildSketch(Plane.XY.offset(-88.04)):
        with Locations((40.7, 0)):
            Circle(SKETCH8_R)
        with Locations((-40.7, 0)):
            Circle(SKETCH8_R)
    extrude(amount=-CUT_EXTRUDE2_DEPTH, mode=Mode.SUBTRACT)


solid = part.part
